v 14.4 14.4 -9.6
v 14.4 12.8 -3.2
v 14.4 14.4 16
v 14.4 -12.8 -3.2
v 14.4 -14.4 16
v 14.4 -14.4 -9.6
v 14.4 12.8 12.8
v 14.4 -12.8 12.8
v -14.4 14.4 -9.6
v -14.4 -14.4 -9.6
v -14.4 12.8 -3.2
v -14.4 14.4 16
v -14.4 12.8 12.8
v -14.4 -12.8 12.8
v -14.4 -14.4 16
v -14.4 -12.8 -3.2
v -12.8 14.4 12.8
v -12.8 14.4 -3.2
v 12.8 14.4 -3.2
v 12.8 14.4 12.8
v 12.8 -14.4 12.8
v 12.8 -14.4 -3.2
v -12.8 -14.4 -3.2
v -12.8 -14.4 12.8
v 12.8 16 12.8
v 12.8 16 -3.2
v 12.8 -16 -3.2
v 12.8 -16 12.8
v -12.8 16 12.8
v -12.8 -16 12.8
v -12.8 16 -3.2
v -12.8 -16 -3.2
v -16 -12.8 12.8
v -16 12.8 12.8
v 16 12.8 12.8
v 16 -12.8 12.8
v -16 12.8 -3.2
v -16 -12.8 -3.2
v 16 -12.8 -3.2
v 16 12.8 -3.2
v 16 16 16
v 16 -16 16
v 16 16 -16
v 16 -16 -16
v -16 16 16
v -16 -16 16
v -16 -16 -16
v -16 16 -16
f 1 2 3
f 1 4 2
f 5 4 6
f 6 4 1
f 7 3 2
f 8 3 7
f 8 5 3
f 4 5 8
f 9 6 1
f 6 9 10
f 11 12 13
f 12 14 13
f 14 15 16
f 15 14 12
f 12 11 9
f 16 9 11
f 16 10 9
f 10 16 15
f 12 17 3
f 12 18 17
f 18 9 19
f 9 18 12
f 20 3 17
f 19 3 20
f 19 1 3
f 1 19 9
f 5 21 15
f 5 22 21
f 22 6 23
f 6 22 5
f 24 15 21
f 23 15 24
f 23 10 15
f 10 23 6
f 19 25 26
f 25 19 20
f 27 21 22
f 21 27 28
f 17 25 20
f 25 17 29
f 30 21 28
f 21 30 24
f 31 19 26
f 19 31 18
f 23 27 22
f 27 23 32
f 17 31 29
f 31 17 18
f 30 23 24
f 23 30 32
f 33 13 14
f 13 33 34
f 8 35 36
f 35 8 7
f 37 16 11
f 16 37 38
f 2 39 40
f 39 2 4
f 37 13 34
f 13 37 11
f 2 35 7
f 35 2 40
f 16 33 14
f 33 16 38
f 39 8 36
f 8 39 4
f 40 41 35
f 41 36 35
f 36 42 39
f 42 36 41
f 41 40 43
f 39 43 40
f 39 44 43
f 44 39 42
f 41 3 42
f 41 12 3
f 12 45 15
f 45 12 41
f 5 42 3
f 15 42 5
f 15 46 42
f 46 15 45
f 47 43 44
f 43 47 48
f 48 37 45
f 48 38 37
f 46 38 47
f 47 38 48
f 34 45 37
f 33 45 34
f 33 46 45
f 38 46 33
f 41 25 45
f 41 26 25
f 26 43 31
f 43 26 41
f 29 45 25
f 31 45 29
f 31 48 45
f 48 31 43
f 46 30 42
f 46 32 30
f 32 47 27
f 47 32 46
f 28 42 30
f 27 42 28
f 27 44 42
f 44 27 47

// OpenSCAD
size=32; //block=32 //item=8


difference(){
cube([size*1,size*1,size*1],center=true);

union(){
translate([0,0,size*0.25]){
cube([size*0.9,size*0.9,size*1.1],center=true);	//hollow
};	//translate
translate([0,0,size*0.15]){
cube([size*0.8,size*1.1,size*0.5],center=true);	//sidesFrontBack
};	//translate
translate([0,0,size*0.15]){
cube([size*1.1,size*0.8,size*0.5],center=true);	//sidesLeftRight
};	//translate
};	//union
};	//difference
